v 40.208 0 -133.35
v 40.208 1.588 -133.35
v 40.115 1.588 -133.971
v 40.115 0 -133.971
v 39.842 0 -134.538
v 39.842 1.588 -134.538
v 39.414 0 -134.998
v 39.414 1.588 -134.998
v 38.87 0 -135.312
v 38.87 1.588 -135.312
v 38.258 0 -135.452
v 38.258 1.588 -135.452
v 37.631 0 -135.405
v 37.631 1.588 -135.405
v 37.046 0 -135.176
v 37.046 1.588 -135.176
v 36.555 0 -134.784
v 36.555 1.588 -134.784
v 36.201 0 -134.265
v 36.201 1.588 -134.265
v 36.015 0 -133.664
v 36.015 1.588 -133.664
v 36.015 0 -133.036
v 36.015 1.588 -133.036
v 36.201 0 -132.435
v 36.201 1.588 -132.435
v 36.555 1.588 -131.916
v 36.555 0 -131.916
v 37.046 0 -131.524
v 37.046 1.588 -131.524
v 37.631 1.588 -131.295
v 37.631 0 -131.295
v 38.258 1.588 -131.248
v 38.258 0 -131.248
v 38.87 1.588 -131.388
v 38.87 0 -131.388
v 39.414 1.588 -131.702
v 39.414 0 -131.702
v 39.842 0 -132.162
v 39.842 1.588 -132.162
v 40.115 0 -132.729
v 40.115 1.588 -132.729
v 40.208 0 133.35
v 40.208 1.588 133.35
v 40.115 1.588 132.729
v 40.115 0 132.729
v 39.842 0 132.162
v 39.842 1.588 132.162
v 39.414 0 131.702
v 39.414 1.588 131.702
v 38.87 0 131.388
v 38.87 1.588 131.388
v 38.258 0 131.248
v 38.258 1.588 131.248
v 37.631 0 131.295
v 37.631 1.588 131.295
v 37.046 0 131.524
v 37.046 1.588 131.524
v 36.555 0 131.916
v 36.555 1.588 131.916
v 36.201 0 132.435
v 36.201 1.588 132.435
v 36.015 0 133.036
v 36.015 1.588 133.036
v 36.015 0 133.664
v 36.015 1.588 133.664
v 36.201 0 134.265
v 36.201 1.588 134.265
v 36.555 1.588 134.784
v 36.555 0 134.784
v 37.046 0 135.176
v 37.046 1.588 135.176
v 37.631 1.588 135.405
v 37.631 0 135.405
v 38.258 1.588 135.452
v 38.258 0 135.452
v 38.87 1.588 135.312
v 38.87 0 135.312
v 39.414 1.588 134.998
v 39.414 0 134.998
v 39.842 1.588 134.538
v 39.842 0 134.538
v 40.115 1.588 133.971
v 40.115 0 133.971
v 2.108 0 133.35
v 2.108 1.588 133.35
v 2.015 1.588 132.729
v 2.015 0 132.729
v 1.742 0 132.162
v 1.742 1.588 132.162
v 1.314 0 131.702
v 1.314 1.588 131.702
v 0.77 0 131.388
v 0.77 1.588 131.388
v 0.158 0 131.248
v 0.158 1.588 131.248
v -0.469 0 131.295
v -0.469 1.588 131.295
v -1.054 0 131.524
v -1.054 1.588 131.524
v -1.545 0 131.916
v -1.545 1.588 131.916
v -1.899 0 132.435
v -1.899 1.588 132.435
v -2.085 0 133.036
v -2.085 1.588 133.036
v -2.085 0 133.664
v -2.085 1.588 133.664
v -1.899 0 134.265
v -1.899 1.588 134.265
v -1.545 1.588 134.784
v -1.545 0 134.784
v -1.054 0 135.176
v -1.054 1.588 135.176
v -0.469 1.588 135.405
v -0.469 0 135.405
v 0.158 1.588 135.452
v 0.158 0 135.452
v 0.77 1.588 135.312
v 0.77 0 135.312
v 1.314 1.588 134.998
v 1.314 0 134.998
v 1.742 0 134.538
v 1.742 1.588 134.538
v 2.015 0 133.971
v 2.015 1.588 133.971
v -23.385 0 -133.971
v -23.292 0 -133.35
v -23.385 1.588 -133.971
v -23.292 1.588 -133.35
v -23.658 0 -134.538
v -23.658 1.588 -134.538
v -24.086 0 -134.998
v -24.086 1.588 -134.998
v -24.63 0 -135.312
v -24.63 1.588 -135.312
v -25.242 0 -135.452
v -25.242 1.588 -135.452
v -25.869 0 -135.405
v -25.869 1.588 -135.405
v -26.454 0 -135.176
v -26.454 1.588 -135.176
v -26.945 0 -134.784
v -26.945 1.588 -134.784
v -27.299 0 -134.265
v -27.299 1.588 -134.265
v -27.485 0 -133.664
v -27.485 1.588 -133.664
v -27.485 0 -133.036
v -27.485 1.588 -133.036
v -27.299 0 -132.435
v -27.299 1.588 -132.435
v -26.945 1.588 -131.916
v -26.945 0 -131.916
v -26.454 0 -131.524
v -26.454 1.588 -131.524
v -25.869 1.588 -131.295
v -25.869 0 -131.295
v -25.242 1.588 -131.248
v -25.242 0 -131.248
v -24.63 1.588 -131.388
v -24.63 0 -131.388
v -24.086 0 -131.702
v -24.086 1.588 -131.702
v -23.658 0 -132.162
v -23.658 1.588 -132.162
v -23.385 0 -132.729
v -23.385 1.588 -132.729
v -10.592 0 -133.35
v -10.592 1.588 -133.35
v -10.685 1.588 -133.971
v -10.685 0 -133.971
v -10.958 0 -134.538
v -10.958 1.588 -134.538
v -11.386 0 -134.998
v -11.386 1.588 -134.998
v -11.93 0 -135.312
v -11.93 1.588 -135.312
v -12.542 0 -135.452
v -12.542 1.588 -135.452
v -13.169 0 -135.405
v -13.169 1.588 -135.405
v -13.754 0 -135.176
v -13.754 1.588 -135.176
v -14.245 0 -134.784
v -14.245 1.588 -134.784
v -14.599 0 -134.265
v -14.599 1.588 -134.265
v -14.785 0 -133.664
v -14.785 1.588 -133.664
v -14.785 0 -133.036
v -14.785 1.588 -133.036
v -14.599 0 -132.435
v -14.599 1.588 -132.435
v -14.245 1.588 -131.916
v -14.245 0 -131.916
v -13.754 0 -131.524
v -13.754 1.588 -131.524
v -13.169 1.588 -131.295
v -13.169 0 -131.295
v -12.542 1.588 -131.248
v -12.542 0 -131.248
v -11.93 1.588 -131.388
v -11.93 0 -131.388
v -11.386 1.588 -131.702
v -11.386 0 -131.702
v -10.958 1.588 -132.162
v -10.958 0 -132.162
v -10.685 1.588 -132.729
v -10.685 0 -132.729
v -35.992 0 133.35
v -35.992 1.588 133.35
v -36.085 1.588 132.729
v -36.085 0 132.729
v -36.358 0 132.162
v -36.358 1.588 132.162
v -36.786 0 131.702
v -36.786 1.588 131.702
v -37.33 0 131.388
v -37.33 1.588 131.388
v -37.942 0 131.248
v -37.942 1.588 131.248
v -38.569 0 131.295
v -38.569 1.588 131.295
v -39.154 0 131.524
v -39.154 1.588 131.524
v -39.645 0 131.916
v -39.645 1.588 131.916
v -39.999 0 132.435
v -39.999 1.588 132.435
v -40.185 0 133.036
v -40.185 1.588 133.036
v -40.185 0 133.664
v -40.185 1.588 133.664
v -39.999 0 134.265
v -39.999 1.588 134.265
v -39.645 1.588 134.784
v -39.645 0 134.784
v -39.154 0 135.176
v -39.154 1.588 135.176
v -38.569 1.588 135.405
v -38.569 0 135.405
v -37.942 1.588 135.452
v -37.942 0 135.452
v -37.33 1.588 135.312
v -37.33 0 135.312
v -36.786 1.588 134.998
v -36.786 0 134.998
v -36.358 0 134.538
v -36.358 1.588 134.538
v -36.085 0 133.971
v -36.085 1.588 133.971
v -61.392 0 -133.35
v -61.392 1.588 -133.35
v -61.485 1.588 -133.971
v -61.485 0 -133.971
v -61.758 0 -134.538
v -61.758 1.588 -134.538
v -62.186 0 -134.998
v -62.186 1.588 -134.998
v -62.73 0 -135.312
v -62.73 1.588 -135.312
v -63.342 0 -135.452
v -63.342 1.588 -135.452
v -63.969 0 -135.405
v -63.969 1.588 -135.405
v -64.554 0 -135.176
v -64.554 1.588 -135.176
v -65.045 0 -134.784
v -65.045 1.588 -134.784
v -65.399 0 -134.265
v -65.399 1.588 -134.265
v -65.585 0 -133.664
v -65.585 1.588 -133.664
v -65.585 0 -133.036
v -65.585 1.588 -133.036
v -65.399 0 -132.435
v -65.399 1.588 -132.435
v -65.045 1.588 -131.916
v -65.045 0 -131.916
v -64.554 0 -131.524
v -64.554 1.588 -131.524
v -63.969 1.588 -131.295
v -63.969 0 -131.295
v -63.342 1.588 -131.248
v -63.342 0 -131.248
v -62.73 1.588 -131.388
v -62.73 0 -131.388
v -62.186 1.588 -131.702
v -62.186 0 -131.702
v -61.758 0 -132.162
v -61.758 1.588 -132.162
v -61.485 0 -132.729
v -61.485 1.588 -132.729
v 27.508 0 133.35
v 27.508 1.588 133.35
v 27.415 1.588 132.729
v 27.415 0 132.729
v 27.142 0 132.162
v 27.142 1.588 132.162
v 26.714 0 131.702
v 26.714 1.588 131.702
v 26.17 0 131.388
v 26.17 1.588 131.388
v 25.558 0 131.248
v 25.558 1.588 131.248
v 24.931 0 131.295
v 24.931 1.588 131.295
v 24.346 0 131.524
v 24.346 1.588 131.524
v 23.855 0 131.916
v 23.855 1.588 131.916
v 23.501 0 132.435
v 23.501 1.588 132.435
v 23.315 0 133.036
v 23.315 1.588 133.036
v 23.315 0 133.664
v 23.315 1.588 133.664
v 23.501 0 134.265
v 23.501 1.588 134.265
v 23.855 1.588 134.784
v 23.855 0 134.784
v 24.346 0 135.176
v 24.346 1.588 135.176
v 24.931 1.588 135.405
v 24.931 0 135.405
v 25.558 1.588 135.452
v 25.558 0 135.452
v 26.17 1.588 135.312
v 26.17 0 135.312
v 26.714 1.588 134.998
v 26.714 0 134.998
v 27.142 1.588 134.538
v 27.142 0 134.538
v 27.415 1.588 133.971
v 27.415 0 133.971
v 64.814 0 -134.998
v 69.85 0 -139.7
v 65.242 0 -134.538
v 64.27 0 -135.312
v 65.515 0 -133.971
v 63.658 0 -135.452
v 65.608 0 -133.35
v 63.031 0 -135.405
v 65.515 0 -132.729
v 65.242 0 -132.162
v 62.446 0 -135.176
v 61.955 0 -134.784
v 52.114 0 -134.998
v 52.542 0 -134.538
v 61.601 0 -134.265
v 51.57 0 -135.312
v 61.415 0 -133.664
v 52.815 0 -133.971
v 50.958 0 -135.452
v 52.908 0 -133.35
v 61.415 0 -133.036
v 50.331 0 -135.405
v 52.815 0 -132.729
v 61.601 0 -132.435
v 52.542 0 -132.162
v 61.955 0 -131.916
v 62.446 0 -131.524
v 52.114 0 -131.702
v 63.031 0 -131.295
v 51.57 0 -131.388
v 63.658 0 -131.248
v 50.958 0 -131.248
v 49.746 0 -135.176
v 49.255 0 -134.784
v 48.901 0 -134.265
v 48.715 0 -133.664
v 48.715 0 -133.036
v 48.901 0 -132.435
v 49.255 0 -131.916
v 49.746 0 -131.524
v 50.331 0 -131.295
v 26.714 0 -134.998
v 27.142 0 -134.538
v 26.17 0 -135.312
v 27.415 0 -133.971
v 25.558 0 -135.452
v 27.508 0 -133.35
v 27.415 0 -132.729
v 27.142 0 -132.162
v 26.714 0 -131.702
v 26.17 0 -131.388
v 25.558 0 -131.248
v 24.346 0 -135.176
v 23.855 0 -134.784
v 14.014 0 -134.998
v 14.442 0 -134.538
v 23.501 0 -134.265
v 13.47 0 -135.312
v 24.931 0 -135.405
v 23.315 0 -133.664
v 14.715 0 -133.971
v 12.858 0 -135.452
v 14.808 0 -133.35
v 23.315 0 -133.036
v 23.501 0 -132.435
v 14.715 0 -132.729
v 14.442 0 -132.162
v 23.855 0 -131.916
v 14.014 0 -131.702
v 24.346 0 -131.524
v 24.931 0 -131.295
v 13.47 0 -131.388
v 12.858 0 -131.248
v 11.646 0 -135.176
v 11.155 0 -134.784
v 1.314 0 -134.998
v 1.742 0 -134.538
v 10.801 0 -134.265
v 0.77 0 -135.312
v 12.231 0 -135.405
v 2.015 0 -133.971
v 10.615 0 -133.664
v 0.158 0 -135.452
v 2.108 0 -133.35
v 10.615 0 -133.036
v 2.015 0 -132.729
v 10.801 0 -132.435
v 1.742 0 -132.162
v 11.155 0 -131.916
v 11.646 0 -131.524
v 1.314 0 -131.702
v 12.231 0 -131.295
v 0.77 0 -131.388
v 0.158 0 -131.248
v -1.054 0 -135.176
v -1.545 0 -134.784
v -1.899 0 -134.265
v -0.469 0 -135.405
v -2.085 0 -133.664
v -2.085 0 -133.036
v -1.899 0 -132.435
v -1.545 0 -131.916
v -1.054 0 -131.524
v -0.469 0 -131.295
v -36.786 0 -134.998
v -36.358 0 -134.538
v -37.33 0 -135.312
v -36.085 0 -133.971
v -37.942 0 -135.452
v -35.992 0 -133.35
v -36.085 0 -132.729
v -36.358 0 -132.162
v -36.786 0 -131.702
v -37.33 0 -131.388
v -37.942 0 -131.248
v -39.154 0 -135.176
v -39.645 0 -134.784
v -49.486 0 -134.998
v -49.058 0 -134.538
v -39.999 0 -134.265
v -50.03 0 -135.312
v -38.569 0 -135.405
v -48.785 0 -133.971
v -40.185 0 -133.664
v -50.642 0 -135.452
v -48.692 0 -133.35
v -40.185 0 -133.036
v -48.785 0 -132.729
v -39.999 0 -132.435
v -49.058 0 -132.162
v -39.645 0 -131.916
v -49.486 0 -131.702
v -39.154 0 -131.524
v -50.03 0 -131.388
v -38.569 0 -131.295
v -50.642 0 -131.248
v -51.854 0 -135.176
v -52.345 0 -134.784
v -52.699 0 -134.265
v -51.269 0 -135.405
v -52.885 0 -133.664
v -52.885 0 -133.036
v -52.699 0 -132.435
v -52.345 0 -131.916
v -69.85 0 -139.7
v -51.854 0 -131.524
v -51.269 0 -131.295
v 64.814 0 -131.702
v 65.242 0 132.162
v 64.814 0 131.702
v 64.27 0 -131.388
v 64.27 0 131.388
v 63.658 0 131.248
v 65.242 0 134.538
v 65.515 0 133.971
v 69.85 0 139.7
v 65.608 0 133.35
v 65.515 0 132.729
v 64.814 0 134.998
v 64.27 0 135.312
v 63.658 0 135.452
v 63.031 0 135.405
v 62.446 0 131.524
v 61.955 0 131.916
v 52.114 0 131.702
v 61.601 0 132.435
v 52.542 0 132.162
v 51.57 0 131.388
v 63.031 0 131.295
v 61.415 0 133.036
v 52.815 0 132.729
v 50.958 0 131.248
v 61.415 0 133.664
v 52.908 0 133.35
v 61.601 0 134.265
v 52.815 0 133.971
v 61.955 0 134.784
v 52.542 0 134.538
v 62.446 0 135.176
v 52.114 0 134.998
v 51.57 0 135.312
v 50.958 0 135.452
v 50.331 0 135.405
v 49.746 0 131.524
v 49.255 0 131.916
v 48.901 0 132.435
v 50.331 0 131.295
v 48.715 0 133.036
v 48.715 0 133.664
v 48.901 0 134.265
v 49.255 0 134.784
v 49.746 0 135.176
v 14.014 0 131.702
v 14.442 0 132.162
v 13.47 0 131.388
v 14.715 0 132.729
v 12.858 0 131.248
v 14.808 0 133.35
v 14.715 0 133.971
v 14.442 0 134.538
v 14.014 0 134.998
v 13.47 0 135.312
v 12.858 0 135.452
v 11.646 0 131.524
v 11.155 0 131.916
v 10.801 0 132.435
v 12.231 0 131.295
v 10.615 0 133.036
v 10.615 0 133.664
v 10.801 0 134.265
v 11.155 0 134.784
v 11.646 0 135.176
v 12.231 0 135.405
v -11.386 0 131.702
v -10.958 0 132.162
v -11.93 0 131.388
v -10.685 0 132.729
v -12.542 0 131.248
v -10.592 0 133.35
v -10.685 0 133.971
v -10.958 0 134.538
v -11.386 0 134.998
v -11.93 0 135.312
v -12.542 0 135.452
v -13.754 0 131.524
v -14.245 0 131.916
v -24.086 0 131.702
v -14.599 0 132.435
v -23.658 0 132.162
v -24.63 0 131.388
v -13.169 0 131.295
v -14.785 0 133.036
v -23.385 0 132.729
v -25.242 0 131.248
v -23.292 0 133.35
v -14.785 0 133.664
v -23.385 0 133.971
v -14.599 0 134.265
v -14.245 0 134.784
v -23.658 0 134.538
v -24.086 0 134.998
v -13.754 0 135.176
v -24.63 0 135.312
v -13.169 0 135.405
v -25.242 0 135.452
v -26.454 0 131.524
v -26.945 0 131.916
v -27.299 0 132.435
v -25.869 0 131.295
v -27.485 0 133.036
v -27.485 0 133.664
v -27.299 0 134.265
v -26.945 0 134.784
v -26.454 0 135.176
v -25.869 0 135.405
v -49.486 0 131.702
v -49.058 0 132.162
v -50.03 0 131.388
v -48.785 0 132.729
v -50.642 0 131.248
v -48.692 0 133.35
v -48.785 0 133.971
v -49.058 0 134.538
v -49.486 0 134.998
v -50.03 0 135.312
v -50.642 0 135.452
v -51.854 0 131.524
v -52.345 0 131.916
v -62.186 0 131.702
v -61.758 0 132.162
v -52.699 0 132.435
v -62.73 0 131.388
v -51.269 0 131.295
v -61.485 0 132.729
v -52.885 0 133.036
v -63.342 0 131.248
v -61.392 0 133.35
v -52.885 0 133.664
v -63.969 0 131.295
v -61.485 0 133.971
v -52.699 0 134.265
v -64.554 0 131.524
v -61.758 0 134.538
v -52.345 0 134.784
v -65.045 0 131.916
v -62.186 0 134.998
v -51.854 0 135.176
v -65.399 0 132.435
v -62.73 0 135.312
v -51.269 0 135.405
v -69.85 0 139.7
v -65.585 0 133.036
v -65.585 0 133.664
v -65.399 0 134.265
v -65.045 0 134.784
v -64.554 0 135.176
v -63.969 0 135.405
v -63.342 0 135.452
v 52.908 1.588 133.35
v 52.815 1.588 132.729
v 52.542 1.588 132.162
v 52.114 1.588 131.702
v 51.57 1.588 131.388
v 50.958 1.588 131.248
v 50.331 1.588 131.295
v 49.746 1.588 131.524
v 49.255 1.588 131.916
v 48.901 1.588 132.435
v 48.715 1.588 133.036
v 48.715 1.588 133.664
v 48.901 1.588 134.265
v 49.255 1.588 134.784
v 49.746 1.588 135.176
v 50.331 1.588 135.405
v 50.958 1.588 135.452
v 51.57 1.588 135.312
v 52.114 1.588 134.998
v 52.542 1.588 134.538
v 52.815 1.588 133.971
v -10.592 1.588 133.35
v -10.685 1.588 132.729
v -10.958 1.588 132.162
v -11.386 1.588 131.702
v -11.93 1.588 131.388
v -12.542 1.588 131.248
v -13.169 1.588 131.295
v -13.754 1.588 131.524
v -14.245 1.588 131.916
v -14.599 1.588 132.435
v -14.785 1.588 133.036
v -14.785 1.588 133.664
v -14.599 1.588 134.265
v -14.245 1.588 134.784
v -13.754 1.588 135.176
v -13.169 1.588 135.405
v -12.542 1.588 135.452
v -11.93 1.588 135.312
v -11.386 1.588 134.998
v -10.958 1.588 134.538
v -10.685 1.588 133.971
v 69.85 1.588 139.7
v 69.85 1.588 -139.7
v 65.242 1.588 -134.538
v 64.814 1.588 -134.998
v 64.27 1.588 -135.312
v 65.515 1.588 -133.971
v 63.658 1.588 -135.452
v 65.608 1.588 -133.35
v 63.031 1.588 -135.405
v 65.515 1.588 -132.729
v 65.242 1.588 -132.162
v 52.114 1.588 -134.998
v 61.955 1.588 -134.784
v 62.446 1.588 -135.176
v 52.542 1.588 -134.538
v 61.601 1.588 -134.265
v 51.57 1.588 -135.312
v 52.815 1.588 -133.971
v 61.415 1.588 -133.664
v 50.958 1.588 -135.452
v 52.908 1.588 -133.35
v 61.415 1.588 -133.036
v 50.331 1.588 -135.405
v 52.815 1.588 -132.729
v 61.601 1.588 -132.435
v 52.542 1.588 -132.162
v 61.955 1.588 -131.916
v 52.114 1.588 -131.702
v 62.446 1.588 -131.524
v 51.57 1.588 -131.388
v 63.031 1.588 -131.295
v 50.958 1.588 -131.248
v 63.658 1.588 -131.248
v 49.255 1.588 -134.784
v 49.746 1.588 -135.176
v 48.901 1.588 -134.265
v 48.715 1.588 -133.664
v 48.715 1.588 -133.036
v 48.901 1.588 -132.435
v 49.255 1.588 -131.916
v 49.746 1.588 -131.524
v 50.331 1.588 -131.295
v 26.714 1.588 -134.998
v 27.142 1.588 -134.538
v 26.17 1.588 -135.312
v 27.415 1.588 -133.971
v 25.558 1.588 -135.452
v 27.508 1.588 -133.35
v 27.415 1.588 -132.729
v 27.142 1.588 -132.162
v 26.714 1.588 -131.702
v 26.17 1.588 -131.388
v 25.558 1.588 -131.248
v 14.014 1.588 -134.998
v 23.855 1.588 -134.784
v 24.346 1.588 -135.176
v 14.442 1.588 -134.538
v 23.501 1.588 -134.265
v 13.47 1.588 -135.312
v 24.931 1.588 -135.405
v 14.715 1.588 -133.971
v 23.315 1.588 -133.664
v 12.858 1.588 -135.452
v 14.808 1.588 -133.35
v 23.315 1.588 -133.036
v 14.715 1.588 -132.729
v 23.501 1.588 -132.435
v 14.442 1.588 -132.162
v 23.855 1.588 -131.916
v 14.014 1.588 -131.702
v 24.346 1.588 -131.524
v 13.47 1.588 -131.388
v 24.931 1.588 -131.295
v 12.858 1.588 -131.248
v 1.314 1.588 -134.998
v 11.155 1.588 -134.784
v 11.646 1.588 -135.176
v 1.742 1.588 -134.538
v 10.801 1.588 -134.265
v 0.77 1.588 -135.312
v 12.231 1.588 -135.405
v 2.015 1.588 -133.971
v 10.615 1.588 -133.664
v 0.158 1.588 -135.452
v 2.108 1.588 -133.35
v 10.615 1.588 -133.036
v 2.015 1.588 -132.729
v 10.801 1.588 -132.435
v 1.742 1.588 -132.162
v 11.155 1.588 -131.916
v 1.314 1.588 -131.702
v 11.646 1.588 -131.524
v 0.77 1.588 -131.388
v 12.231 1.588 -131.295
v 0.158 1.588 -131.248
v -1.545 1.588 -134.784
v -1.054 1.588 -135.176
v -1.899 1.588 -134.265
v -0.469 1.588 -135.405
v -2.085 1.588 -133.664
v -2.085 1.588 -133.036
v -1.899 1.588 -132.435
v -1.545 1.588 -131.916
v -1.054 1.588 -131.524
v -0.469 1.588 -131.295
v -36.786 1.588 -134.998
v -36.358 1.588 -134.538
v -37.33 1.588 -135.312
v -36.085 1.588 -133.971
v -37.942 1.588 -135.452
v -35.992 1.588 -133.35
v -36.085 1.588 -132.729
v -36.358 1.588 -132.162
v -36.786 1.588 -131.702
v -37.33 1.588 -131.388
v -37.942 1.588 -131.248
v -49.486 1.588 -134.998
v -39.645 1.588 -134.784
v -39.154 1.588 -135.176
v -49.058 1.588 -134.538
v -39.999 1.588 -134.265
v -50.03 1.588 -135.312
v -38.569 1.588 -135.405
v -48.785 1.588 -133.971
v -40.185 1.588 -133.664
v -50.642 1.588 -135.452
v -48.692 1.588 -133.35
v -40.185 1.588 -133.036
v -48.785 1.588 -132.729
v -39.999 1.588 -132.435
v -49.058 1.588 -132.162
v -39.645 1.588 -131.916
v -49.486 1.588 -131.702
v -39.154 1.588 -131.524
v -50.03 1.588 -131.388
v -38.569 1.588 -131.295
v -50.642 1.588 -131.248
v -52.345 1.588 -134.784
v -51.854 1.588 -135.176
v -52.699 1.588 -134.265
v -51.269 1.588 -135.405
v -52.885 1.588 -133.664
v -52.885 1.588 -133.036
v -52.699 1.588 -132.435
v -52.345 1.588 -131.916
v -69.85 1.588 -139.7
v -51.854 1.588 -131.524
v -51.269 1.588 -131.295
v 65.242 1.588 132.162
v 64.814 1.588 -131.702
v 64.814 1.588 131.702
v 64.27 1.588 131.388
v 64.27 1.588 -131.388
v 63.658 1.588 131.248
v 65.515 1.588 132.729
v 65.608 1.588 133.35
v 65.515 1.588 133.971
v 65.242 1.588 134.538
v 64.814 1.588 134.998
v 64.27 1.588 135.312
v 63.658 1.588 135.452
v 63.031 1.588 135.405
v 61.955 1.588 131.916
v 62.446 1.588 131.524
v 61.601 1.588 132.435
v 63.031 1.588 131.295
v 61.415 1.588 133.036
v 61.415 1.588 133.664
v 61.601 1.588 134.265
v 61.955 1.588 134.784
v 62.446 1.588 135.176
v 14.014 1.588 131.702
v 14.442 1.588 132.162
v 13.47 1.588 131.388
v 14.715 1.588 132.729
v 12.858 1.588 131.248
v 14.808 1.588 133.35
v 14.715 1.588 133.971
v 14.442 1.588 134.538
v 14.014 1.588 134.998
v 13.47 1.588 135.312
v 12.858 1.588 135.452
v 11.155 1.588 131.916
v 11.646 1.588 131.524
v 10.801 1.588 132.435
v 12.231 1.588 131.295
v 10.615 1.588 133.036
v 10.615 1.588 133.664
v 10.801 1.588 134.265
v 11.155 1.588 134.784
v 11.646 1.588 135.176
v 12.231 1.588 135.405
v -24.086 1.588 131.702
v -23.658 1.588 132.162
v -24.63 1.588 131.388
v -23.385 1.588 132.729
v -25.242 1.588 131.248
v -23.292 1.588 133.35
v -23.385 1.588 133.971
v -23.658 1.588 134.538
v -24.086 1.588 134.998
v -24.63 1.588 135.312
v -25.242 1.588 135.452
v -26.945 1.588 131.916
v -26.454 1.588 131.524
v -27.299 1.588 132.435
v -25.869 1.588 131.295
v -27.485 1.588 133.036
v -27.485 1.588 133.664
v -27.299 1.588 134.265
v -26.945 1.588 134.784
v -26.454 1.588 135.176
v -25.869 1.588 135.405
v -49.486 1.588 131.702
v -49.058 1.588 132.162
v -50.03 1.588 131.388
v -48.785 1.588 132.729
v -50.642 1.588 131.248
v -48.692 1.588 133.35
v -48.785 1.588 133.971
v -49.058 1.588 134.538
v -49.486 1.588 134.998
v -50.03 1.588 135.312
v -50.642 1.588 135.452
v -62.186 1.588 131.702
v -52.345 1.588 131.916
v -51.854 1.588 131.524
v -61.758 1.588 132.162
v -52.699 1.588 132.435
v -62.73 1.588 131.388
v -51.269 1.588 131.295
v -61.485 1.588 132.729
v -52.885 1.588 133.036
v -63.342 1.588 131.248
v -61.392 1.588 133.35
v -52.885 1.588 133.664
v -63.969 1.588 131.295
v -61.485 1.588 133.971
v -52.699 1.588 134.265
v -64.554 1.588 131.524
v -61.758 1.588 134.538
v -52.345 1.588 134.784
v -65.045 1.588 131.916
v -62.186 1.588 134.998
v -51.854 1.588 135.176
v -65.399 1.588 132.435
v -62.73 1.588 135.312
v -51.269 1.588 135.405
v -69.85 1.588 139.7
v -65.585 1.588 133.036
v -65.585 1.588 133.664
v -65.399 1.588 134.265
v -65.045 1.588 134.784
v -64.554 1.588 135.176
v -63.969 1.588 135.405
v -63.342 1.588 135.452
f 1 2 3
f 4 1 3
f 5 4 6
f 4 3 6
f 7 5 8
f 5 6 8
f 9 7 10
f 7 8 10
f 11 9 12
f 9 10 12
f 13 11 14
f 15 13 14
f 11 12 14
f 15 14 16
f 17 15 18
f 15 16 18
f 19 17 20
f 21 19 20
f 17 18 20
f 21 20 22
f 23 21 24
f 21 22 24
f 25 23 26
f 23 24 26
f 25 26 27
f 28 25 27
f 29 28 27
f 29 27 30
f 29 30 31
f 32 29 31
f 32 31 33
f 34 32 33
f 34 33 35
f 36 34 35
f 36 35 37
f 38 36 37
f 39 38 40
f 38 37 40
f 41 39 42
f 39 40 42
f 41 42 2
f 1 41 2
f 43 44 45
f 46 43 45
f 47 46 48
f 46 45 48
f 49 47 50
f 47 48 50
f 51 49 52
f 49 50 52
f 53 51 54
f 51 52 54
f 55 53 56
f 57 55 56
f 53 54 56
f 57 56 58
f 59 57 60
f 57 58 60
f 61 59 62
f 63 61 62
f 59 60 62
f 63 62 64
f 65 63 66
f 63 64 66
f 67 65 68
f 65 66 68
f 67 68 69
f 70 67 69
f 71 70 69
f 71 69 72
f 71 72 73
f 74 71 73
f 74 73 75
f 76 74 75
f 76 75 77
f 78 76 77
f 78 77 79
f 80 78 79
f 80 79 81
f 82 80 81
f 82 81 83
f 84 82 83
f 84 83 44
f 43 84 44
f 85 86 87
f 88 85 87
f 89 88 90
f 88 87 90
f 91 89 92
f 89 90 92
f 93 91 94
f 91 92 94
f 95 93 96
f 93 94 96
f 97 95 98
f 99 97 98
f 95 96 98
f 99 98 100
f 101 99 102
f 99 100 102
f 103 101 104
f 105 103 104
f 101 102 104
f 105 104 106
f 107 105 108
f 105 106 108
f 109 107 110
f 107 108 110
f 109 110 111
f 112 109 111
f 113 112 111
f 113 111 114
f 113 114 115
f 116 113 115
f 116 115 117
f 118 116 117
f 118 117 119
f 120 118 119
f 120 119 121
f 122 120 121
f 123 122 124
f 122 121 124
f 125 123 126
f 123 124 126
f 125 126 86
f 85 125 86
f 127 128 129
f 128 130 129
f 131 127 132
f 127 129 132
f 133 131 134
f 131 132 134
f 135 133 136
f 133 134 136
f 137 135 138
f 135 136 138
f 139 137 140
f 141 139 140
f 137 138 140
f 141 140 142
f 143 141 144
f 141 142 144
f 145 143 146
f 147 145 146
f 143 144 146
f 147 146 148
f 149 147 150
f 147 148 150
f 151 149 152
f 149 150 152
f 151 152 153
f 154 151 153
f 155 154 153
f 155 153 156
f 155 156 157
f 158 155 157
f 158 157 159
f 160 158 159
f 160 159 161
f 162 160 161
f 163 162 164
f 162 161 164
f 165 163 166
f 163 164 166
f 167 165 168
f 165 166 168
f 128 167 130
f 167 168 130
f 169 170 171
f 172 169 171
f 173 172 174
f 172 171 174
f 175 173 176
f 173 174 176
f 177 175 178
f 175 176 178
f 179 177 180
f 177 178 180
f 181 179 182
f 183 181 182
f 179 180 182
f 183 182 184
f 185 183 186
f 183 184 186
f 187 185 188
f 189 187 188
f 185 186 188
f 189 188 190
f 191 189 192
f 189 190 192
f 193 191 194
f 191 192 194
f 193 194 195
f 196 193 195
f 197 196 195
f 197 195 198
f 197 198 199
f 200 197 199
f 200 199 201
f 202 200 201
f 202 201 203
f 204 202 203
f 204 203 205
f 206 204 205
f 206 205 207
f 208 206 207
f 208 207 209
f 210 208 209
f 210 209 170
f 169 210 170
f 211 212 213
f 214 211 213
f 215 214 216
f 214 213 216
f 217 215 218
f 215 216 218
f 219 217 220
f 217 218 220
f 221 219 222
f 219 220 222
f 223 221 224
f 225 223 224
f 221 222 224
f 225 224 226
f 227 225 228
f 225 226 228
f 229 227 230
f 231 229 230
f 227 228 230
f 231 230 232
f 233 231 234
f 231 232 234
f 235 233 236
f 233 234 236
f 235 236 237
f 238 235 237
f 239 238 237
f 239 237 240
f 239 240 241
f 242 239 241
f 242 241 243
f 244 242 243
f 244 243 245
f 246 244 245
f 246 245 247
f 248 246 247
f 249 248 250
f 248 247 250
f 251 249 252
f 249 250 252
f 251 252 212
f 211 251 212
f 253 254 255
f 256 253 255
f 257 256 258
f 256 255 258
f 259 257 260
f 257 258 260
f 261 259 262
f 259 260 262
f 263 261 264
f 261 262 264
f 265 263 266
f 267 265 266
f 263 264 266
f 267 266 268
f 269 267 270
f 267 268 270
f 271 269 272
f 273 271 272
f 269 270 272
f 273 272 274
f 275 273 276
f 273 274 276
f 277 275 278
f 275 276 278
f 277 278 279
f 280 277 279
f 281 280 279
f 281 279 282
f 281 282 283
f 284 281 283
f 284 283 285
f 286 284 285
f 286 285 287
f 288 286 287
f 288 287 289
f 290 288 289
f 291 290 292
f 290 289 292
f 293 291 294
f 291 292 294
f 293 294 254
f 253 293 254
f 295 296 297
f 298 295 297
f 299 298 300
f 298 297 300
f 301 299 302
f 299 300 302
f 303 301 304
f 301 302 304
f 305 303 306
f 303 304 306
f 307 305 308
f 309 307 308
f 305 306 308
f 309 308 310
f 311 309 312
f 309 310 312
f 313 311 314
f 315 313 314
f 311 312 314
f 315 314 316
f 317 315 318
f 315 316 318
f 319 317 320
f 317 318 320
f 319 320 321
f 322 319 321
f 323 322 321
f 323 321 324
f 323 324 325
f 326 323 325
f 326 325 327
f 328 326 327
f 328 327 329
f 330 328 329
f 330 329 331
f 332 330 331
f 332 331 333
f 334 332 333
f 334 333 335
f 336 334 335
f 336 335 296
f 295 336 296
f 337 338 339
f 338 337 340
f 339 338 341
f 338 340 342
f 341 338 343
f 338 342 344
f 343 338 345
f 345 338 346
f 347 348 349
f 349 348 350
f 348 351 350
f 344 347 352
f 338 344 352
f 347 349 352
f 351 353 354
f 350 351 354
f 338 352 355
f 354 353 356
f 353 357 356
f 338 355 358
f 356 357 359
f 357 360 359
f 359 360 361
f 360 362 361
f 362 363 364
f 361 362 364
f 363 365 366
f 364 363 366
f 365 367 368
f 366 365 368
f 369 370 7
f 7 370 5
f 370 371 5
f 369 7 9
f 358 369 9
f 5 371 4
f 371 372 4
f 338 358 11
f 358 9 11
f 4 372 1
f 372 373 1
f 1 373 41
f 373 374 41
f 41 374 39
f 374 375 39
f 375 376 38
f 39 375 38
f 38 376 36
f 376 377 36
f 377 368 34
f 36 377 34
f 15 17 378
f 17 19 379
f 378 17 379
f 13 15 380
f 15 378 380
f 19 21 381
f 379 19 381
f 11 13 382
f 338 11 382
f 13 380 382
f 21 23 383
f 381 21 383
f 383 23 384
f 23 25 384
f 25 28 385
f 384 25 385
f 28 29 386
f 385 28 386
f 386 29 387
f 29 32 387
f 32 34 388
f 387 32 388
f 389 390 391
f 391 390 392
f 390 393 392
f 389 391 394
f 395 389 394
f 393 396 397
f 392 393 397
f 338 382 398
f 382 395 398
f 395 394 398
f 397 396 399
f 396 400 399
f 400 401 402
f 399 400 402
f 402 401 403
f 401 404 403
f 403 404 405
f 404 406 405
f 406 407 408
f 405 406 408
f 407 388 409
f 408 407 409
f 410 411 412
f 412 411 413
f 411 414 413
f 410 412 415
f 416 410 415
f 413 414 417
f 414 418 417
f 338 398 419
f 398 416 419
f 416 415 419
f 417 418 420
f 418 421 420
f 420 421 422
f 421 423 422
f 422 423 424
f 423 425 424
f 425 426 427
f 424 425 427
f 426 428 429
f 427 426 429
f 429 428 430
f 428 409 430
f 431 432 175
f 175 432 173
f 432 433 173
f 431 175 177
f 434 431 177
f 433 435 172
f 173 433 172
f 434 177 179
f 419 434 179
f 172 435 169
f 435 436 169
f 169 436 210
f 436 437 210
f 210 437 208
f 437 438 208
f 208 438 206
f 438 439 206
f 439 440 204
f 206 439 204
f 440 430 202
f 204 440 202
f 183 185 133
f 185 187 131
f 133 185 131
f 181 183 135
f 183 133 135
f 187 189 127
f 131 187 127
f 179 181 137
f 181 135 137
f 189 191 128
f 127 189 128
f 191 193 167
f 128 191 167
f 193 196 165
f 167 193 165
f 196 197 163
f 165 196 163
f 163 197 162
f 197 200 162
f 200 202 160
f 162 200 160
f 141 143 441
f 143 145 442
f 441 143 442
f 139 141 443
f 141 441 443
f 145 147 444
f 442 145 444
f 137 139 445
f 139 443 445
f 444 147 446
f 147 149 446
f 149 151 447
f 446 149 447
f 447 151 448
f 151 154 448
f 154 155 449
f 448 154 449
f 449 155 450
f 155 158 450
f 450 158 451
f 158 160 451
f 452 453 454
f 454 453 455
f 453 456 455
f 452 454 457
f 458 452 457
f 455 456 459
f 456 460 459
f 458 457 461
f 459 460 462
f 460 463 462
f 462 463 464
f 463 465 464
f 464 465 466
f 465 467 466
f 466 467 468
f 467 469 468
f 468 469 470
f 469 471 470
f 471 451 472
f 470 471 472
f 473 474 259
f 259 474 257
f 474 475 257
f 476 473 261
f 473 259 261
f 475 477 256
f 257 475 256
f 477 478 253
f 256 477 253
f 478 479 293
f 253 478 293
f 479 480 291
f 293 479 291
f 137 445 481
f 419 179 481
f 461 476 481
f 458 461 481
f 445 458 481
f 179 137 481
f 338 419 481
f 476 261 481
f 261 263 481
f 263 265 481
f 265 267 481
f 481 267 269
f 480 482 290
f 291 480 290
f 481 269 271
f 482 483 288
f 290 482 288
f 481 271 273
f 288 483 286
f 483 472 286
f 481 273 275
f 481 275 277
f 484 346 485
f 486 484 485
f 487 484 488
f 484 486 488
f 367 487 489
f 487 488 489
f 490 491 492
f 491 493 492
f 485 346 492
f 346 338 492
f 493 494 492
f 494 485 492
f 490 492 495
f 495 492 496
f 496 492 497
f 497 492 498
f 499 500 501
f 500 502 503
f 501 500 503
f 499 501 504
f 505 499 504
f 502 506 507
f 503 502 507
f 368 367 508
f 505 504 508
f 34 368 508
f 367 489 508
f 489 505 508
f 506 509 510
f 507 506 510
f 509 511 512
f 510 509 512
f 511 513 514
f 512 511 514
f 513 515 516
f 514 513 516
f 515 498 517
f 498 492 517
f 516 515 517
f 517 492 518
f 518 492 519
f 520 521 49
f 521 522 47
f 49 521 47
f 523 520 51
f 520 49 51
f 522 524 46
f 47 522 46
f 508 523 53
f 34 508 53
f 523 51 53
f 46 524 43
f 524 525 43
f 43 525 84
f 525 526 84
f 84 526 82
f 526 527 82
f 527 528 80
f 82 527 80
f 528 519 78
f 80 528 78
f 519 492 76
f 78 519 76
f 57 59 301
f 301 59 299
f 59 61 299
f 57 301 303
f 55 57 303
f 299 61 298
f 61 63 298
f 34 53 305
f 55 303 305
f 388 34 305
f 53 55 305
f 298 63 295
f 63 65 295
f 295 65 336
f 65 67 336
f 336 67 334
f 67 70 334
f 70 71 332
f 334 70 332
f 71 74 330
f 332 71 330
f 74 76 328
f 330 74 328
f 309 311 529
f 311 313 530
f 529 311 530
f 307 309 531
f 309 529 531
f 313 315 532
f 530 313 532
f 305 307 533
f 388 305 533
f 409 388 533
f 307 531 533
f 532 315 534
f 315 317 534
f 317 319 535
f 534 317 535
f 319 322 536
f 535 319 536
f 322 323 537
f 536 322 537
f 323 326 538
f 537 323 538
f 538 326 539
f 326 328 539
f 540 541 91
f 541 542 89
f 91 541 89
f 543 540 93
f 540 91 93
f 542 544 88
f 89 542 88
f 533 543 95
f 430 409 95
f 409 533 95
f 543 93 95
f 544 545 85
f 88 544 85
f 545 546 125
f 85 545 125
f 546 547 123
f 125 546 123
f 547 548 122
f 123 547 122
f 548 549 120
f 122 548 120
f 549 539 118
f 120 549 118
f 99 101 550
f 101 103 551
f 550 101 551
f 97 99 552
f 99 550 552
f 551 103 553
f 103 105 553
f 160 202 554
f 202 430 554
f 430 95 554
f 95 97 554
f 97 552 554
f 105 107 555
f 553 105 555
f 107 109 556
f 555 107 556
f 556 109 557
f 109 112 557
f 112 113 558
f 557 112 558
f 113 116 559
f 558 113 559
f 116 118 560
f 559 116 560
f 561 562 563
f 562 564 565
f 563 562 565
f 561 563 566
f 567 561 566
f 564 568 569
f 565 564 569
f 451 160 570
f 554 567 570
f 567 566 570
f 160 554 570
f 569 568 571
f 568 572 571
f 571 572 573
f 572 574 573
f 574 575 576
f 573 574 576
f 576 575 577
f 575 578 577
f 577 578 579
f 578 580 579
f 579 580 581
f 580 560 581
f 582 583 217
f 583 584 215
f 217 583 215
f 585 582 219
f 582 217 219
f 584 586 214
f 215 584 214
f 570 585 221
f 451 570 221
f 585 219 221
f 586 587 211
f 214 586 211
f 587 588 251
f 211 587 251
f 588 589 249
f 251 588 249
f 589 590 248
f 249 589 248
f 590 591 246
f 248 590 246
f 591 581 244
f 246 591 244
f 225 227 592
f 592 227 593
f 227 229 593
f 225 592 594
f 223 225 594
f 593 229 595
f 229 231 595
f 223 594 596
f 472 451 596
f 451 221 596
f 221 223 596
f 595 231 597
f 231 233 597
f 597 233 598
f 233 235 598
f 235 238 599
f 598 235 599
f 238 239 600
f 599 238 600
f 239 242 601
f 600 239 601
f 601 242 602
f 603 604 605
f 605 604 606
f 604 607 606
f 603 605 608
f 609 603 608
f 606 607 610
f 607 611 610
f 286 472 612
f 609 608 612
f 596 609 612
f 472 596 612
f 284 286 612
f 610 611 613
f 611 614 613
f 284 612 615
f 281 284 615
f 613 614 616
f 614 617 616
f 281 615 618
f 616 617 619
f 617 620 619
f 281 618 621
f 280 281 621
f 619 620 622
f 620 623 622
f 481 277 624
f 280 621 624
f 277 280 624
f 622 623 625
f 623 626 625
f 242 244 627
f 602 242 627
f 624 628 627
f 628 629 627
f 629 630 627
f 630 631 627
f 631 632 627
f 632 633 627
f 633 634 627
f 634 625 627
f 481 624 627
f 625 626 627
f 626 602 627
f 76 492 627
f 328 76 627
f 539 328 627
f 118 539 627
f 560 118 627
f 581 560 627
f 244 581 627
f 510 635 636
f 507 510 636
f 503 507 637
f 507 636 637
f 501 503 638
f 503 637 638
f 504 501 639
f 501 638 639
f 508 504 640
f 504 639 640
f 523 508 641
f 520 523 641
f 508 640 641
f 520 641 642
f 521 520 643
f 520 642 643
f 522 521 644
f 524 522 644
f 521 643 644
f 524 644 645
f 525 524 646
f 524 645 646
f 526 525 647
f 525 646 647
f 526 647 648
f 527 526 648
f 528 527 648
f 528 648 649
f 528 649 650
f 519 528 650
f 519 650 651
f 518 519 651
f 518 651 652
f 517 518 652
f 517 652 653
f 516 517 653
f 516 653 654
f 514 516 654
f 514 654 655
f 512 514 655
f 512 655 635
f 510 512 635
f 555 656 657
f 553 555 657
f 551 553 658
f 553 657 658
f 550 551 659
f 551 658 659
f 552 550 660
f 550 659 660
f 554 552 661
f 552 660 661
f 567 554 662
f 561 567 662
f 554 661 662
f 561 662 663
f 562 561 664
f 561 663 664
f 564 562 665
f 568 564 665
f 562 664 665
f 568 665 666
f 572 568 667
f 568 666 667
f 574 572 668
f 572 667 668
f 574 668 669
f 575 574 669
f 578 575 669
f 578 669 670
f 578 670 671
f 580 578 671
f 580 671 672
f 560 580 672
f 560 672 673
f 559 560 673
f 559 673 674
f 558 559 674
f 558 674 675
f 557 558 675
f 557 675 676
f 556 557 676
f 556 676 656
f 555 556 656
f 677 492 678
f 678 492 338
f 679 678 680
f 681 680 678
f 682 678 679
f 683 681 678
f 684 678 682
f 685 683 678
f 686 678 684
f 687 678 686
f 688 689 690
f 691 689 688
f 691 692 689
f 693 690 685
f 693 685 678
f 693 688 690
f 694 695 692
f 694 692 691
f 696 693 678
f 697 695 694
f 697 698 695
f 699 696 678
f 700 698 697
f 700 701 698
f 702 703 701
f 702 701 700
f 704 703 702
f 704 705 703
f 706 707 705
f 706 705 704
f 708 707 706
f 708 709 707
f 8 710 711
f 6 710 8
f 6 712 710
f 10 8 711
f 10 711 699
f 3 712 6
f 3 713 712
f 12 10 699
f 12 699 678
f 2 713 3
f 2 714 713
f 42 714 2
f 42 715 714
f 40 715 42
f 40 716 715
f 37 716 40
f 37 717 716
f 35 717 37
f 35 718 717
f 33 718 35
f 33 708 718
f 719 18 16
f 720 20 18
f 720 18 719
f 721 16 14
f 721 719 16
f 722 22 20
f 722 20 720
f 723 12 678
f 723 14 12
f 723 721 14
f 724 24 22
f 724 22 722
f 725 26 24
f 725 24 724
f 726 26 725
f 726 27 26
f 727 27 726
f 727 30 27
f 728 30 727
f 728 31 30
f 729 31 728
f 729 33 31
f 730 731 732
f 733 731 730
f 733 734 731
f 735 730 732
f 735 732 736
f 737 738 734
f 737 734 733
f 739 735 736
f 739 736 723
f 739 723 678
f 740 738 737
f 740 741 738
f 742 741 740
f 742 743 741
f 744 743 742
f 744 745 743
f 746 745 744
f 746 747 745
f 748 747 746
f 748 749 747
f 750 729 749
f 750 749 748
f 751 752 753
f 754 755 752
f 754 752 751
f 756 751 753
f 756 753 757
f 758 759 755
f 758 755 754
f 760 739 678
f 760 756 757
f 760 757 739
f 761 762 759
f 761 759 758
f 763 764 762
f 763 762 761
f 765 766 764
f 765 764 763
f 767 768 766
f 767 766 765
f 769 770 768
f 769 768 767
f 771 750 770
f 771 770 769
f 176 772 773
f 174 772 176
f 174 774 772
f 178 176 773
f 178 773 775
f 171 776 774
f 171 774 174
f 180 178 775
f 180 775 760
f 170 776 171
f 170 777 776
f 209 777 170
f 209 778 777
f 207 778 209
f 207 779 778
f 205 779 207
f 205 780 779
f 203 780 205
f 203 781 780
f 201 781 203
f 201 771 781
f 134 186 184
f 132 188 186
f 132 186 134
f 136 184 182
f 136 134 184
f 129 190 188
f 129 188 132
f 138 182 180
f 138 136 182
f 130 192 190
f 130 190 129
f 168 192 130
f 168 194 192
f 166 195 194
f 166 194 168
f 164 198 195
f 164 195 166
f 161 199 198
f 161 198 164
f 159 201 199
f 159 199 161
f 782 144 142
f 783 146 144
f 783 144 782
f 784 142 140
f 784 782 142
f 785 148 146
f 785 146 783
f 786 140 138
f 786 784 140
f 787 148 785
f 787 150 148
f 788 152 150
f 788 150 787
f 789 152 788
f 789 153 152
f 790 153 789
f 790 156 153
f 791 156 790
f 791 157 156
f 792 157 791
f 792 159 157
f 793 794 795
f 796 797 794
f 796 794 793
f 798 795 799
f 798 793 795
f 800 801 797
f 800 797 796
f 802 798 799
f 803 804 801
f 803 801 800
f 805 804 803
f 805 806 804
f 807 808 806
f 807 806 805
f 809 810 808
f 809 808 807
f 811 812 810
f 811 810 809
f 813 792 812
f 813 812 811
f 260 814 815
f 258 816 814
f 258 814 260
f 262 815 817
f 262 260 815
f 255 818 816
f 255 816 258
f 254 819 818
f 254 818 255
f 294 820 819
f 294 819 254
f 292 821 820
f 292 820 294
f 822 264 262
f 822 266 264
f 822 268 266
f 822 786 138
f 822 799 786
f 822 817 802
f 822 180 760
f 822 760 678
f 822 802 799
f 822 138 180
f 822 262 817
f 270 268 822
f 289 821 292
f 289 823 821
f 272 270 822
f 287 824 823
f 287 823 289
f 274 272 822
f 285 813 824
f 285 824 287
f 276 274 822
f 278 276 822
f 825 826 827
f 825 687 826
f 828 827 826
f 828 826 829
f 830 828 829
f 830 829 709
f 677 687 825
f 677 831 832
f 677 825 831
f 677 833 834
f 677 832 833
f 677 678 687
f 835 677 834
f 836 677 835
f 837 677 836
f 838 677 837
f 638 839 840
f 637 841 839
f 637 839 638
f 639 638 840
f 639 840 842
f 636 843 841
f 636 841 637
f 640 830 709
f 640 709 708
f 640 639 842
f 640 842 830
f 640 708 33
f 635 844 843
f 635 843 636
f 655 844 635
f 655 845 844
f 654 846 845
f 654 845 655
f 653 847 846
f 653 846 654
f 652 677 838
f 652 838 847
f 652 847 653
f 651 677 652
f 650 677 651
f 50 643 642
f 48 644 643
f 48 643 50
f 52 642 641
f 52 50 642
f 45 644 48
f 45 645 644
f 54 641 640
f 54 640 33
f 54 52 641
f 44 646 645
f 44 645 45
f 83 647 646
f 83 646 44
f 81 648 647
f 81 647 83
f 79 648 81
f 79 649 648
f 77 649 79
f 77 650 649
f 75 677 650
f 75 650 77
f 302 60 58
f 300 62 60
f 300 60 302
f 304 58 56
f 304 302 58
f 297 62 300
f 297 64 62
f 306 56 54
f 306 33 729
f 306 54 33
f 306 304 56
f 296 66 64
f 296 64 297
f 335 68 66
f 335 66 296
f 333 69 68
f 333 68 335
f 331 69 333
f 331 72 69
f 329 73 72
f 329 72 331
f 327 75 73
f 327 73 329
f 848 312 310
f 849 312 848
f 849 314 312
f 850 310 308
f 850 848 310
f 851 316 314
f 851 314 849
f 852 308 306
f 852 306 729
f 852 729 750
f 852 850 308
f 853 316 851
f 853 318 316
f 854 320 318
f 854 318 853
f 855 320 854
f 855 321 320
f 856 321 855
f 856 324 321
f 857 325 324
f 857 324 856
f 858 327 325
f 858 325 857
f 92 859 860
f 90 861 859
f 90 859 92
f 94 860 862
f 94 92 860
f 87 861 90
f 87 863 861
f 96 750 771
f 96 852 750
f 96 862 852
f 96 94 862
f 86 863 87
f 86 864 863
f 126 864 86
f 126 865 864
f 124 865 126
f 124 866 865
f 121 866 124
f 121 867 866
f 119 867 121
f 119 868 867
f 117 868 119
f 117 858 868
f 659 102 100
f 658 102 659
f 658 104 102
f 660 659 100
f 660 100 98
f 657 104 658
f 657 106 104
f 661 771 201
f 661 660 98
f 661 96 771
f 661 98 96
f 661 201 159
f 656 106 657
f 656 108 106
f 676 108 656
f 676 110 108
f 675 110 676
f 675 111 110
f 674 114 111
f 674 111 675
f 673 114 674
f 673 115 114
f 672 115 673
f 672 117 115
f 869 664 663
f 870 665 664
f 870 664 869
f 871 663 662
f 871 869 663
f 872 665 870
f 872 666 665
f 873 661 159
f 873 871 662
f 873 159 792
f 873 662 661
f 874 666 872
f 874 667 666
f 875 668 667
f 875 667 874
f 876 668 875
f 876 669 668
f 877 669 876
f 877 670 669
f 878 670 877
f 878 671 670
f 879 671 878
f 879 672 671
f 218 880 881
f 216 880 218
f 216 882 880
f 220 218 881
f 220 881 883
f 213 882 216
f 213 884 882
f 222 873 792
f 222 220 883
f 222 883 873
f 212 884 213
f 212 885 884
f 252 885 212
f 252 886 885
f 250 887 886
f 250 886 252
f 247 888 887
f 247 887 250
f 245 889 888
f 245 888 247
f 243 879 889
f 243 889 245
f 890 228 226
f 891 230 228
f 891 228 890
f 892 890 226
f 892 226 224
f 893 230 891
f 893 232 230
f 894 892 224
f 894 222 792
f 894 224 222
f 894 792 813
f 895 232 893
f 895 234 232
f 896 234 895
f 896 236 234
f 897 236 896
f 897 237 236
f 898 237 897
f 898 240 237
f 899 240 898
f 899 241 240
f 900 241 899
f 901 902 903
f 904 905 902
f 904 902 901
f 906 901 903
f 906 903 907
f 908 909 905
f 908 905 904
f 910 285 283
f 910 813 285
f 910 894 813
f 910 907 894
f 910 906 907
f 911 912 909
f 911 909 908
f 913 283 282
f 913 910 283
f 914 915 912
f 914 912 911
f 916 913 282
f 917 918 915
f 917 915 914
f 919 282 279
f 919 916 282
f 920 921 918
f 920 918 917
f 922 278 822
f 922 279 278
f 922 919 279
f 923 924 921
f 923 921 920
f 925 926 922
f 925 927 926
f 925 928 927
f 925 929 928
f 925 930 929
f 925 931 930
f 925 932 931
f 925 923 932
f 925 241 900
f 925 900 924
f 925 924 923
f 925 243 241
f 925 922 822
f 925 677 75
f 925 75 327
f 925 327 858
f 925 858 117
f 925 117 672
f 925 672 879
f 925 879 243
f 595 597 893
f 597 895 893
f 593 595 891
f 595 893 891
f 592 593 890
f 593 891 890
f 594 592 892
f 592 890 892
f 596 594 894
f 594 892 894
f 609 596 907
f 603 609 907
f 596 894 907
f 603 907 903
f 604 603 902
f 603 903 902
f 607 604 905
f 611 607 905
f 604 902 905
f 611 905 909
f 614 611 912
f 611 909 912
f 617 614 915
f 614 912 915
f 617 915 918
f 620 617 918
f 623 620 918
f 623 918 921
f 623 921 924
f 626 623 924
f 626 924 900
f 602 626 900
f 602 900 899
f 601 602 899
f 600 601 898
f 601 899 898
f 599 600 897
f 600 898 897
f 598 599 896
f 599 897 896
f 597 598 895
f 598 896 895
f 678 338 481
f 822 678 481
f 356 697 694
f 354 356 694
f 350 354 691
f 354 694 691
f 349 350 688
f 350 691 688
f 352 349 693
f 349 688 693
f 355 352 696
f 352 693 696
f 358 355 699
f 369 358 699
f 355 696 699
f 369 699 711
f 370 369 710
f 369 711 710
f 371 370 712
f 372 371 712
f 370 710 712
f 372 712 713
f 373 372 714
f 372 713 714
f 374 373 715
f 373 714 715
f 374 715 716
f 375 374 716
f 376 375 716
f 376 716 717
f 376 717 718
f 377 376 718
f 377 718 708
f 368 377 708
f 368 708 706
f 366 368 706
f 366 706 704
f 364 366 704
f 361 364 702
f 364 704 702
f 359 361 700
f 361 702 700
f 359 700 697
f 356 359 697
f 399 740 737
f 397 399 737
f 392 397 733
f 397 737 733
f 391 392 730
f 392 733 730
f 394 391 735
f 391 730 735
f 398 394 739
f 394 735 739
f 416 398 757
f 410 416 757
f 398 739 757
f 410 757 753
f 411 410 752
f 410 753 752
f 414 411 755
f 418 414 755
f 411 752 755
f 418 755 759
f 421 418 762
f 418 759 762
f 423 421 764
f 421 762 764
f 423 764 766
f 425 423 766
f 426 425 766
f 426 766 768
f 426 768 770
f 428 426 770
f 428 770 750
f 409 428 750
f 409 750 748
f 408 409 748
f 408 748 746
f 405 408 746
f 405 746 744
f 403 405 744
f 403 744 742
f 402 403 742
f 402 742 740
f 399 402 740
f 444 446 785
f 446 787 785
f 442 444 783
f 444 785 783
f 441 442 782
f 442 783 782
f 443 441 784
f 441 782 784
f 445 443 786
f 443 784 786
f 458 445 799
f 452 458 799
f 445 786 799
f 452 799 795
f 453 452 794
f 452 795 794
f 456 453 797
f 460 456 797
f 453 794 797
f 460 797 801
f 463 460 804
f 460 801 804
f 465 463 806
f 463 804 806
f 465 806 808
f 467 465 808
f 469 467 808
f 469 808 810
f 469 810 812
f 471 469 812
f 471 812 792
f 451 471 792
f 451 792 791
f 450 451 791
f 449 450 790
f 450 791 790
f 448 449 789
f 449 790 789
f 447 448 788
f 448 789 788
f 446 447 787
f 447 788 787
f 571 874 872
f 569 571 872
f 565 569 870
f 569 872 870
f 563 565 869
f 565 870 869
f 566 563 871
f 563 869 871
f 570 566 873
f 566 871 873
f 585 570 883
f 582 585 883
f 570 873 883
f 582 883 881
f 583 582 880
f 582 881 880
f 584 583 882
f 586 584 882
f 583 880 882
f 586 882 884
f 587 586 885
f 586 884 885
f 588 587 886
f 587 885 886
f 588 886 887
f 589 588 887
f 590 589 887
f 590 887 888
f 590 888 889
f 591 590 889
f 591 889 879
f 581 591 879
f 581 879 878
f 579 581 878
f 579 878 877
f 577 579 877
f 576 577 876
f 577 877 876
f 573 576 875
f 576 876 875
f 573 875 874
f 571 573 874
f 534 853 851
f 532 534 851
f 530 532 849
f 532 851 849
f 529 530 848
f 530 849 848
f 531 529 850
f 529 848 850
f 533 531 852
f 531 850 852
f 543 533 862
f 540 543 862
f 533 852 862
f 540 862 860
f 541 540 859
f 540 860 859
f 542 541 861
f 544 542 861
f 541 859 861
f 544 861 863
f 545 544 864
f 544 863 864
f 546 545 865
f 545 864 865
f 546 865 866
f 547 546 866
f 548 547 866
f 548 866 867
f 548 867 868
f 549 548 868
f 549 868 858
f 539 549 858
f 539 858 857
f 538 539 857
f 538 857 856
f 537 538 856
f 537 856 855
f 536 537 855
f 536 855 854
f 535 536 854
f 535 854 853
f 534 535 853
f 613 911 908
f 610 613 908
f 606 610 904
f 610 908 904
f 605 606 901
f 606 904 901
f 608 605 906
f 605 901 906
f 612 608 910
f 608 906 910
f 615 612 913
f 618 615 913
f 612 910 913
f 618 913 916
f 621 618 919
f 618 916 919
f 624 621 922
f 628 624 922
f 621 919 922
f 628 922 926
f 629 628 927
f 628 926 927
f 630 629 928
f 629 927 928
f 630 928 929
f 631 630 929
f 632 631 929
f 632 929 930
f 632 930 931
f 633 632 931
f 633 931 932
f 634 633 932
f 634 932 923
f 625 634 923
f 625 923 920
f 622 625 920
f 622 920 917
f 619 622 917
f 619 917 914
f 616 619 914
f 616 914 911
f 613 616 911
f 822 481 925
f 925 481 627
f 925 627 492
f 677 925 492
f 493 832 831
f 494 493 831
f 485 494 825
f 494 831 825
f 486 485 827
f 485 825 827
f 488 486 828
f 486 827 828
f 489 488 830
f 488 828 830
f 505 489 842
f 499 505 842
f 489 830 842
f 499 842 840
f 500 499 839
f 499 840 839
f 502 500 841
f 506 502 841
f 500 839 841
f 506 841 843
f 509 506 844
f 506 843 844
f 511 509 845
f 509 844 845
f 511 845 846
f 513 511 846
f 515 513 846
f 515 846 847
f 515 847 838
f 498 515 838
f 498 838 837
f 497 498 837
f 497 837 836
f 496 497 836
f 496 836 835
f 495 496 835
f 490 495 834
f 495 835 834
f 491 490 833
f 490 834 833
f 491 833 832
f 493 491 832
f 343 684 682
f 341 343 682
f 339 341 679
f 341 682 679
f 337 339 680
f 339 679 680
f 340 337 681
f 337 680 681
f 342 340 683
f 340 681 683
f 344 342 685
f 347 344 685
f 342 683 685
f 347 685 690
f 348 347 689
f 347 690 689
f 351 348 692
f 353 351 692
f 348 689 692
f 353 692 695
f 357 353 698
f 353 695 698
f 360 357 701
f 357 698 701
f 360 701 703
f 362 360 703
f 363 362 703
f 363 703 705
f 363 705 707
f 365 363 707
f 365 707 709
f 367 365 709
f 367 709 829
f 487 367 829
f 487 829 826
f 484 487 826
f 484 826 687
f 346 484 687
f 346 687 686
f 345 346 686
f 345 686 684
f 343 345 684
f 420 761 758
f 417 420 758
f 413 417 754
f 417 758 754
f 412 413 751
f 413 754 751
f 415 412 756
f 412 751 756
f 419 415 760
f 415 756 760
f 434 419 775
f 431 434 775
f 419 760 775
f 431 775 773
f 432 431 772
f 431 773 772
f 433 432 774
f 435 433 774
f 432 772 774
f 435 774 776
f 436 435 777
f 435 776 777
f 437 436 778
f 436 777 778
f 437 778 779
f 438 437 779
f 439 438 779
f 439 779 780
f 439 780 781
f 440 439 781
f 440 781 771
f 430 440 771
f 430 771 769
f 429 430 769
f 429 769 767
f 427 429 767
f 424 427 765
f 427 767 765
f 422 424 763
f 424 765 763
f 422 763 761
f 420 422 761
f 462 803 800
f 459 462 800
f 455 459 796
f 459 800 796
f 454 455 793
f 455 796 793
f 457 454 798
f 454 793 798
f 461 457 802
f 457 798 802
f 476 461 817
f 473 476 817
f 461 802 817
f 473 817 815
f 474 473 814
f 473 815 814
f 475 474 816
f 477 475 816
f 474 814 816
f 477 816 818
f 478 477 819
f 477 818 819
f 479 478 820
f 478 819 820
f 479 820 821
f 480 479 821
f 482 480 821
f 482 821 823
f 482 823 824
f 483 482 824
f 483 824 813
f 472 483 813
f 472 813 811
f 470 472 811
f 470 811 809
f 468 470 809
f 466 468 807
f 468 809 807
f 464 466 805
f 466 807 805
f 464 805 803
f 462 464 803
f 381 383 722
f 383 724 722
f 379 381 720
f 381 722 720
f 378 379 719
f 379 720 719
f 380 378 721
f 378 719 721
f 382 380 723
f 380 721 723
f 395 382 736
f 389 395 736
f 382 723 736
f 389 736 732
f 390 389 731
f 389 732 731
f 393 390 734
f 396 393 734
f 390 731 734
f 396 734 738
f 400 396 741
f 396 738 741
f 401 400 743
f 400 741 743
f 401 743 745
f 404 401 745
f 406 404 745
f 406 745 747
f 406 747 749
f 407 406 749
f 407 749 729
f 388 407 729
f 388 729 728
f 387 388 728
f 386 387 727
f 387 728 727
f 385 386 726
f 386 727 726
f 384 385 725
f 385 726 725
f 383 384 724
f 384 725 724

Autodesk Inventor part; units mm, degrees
ref_plane "YZ Plane" through (0, 0, 0) normal (1, 0, 0) x (0, 1, 0)
ref_plane "XZ Plane" through (0, 0, 0) normal (0, 1, 0) x (-1, 0, 0)
ref_plane "XY Plane" through (0, 0, 0) normal (0, 0, 1) x (1, 0, 0)
sketch "Sketch1" plane through (0, 0, 0) normal (0, 1, 0) x (-1, 0, 0)
  line L0 (-69.85, -139.7) -> (69.85, -139.7)
  line L1 (69.85, -139.7) -> (69.85, 139.7)
  line L2 (69.85, 139.7) -> (-69.85, 139.7)
  line L3 (-69.85, 139.7) -> (-69.85, -139.7)
  line L4 (-69.85, -139.7) -> (69.85, 139.7) construction
  line L5 (69.85, -139.7) -> (-69.85, 139.7) construction
  point P0 (0, 0)
  dimension "d0" = 139.7
  dimension "d1" = 279.4
extrude "Extrusion1" add sketch "Sketch1" along normal blind 1.5875
sketch "Sketch2" plane through (0, 1.5875, 0) normal (0, 1, 0) x (1, 0, 0)
  circle A0 centre (-63.5, 133.35) radius 2.1082
  line L0 (-69.85, 139.7) -> (-69.85, -139.7) projected
  line L1 (69.85, 139.7) -> (-69.85, 139.7) projected
  point P0 (0, 0)
  dimension "d4" = 4.2164
  dimension "d5" = 6.35
  dimension "d6" = 6.35
extrude "Extrusion2" cut sketch "Sketch2" against normal blind 1.5875
pattern_linear "Rectangular Pattern1" count 11 spacing 12.7 along (1, 0, 0) count 2 spacing 266.7 along (0, 0, 1) of "Extrusion2"
properties part number "Blocker"
